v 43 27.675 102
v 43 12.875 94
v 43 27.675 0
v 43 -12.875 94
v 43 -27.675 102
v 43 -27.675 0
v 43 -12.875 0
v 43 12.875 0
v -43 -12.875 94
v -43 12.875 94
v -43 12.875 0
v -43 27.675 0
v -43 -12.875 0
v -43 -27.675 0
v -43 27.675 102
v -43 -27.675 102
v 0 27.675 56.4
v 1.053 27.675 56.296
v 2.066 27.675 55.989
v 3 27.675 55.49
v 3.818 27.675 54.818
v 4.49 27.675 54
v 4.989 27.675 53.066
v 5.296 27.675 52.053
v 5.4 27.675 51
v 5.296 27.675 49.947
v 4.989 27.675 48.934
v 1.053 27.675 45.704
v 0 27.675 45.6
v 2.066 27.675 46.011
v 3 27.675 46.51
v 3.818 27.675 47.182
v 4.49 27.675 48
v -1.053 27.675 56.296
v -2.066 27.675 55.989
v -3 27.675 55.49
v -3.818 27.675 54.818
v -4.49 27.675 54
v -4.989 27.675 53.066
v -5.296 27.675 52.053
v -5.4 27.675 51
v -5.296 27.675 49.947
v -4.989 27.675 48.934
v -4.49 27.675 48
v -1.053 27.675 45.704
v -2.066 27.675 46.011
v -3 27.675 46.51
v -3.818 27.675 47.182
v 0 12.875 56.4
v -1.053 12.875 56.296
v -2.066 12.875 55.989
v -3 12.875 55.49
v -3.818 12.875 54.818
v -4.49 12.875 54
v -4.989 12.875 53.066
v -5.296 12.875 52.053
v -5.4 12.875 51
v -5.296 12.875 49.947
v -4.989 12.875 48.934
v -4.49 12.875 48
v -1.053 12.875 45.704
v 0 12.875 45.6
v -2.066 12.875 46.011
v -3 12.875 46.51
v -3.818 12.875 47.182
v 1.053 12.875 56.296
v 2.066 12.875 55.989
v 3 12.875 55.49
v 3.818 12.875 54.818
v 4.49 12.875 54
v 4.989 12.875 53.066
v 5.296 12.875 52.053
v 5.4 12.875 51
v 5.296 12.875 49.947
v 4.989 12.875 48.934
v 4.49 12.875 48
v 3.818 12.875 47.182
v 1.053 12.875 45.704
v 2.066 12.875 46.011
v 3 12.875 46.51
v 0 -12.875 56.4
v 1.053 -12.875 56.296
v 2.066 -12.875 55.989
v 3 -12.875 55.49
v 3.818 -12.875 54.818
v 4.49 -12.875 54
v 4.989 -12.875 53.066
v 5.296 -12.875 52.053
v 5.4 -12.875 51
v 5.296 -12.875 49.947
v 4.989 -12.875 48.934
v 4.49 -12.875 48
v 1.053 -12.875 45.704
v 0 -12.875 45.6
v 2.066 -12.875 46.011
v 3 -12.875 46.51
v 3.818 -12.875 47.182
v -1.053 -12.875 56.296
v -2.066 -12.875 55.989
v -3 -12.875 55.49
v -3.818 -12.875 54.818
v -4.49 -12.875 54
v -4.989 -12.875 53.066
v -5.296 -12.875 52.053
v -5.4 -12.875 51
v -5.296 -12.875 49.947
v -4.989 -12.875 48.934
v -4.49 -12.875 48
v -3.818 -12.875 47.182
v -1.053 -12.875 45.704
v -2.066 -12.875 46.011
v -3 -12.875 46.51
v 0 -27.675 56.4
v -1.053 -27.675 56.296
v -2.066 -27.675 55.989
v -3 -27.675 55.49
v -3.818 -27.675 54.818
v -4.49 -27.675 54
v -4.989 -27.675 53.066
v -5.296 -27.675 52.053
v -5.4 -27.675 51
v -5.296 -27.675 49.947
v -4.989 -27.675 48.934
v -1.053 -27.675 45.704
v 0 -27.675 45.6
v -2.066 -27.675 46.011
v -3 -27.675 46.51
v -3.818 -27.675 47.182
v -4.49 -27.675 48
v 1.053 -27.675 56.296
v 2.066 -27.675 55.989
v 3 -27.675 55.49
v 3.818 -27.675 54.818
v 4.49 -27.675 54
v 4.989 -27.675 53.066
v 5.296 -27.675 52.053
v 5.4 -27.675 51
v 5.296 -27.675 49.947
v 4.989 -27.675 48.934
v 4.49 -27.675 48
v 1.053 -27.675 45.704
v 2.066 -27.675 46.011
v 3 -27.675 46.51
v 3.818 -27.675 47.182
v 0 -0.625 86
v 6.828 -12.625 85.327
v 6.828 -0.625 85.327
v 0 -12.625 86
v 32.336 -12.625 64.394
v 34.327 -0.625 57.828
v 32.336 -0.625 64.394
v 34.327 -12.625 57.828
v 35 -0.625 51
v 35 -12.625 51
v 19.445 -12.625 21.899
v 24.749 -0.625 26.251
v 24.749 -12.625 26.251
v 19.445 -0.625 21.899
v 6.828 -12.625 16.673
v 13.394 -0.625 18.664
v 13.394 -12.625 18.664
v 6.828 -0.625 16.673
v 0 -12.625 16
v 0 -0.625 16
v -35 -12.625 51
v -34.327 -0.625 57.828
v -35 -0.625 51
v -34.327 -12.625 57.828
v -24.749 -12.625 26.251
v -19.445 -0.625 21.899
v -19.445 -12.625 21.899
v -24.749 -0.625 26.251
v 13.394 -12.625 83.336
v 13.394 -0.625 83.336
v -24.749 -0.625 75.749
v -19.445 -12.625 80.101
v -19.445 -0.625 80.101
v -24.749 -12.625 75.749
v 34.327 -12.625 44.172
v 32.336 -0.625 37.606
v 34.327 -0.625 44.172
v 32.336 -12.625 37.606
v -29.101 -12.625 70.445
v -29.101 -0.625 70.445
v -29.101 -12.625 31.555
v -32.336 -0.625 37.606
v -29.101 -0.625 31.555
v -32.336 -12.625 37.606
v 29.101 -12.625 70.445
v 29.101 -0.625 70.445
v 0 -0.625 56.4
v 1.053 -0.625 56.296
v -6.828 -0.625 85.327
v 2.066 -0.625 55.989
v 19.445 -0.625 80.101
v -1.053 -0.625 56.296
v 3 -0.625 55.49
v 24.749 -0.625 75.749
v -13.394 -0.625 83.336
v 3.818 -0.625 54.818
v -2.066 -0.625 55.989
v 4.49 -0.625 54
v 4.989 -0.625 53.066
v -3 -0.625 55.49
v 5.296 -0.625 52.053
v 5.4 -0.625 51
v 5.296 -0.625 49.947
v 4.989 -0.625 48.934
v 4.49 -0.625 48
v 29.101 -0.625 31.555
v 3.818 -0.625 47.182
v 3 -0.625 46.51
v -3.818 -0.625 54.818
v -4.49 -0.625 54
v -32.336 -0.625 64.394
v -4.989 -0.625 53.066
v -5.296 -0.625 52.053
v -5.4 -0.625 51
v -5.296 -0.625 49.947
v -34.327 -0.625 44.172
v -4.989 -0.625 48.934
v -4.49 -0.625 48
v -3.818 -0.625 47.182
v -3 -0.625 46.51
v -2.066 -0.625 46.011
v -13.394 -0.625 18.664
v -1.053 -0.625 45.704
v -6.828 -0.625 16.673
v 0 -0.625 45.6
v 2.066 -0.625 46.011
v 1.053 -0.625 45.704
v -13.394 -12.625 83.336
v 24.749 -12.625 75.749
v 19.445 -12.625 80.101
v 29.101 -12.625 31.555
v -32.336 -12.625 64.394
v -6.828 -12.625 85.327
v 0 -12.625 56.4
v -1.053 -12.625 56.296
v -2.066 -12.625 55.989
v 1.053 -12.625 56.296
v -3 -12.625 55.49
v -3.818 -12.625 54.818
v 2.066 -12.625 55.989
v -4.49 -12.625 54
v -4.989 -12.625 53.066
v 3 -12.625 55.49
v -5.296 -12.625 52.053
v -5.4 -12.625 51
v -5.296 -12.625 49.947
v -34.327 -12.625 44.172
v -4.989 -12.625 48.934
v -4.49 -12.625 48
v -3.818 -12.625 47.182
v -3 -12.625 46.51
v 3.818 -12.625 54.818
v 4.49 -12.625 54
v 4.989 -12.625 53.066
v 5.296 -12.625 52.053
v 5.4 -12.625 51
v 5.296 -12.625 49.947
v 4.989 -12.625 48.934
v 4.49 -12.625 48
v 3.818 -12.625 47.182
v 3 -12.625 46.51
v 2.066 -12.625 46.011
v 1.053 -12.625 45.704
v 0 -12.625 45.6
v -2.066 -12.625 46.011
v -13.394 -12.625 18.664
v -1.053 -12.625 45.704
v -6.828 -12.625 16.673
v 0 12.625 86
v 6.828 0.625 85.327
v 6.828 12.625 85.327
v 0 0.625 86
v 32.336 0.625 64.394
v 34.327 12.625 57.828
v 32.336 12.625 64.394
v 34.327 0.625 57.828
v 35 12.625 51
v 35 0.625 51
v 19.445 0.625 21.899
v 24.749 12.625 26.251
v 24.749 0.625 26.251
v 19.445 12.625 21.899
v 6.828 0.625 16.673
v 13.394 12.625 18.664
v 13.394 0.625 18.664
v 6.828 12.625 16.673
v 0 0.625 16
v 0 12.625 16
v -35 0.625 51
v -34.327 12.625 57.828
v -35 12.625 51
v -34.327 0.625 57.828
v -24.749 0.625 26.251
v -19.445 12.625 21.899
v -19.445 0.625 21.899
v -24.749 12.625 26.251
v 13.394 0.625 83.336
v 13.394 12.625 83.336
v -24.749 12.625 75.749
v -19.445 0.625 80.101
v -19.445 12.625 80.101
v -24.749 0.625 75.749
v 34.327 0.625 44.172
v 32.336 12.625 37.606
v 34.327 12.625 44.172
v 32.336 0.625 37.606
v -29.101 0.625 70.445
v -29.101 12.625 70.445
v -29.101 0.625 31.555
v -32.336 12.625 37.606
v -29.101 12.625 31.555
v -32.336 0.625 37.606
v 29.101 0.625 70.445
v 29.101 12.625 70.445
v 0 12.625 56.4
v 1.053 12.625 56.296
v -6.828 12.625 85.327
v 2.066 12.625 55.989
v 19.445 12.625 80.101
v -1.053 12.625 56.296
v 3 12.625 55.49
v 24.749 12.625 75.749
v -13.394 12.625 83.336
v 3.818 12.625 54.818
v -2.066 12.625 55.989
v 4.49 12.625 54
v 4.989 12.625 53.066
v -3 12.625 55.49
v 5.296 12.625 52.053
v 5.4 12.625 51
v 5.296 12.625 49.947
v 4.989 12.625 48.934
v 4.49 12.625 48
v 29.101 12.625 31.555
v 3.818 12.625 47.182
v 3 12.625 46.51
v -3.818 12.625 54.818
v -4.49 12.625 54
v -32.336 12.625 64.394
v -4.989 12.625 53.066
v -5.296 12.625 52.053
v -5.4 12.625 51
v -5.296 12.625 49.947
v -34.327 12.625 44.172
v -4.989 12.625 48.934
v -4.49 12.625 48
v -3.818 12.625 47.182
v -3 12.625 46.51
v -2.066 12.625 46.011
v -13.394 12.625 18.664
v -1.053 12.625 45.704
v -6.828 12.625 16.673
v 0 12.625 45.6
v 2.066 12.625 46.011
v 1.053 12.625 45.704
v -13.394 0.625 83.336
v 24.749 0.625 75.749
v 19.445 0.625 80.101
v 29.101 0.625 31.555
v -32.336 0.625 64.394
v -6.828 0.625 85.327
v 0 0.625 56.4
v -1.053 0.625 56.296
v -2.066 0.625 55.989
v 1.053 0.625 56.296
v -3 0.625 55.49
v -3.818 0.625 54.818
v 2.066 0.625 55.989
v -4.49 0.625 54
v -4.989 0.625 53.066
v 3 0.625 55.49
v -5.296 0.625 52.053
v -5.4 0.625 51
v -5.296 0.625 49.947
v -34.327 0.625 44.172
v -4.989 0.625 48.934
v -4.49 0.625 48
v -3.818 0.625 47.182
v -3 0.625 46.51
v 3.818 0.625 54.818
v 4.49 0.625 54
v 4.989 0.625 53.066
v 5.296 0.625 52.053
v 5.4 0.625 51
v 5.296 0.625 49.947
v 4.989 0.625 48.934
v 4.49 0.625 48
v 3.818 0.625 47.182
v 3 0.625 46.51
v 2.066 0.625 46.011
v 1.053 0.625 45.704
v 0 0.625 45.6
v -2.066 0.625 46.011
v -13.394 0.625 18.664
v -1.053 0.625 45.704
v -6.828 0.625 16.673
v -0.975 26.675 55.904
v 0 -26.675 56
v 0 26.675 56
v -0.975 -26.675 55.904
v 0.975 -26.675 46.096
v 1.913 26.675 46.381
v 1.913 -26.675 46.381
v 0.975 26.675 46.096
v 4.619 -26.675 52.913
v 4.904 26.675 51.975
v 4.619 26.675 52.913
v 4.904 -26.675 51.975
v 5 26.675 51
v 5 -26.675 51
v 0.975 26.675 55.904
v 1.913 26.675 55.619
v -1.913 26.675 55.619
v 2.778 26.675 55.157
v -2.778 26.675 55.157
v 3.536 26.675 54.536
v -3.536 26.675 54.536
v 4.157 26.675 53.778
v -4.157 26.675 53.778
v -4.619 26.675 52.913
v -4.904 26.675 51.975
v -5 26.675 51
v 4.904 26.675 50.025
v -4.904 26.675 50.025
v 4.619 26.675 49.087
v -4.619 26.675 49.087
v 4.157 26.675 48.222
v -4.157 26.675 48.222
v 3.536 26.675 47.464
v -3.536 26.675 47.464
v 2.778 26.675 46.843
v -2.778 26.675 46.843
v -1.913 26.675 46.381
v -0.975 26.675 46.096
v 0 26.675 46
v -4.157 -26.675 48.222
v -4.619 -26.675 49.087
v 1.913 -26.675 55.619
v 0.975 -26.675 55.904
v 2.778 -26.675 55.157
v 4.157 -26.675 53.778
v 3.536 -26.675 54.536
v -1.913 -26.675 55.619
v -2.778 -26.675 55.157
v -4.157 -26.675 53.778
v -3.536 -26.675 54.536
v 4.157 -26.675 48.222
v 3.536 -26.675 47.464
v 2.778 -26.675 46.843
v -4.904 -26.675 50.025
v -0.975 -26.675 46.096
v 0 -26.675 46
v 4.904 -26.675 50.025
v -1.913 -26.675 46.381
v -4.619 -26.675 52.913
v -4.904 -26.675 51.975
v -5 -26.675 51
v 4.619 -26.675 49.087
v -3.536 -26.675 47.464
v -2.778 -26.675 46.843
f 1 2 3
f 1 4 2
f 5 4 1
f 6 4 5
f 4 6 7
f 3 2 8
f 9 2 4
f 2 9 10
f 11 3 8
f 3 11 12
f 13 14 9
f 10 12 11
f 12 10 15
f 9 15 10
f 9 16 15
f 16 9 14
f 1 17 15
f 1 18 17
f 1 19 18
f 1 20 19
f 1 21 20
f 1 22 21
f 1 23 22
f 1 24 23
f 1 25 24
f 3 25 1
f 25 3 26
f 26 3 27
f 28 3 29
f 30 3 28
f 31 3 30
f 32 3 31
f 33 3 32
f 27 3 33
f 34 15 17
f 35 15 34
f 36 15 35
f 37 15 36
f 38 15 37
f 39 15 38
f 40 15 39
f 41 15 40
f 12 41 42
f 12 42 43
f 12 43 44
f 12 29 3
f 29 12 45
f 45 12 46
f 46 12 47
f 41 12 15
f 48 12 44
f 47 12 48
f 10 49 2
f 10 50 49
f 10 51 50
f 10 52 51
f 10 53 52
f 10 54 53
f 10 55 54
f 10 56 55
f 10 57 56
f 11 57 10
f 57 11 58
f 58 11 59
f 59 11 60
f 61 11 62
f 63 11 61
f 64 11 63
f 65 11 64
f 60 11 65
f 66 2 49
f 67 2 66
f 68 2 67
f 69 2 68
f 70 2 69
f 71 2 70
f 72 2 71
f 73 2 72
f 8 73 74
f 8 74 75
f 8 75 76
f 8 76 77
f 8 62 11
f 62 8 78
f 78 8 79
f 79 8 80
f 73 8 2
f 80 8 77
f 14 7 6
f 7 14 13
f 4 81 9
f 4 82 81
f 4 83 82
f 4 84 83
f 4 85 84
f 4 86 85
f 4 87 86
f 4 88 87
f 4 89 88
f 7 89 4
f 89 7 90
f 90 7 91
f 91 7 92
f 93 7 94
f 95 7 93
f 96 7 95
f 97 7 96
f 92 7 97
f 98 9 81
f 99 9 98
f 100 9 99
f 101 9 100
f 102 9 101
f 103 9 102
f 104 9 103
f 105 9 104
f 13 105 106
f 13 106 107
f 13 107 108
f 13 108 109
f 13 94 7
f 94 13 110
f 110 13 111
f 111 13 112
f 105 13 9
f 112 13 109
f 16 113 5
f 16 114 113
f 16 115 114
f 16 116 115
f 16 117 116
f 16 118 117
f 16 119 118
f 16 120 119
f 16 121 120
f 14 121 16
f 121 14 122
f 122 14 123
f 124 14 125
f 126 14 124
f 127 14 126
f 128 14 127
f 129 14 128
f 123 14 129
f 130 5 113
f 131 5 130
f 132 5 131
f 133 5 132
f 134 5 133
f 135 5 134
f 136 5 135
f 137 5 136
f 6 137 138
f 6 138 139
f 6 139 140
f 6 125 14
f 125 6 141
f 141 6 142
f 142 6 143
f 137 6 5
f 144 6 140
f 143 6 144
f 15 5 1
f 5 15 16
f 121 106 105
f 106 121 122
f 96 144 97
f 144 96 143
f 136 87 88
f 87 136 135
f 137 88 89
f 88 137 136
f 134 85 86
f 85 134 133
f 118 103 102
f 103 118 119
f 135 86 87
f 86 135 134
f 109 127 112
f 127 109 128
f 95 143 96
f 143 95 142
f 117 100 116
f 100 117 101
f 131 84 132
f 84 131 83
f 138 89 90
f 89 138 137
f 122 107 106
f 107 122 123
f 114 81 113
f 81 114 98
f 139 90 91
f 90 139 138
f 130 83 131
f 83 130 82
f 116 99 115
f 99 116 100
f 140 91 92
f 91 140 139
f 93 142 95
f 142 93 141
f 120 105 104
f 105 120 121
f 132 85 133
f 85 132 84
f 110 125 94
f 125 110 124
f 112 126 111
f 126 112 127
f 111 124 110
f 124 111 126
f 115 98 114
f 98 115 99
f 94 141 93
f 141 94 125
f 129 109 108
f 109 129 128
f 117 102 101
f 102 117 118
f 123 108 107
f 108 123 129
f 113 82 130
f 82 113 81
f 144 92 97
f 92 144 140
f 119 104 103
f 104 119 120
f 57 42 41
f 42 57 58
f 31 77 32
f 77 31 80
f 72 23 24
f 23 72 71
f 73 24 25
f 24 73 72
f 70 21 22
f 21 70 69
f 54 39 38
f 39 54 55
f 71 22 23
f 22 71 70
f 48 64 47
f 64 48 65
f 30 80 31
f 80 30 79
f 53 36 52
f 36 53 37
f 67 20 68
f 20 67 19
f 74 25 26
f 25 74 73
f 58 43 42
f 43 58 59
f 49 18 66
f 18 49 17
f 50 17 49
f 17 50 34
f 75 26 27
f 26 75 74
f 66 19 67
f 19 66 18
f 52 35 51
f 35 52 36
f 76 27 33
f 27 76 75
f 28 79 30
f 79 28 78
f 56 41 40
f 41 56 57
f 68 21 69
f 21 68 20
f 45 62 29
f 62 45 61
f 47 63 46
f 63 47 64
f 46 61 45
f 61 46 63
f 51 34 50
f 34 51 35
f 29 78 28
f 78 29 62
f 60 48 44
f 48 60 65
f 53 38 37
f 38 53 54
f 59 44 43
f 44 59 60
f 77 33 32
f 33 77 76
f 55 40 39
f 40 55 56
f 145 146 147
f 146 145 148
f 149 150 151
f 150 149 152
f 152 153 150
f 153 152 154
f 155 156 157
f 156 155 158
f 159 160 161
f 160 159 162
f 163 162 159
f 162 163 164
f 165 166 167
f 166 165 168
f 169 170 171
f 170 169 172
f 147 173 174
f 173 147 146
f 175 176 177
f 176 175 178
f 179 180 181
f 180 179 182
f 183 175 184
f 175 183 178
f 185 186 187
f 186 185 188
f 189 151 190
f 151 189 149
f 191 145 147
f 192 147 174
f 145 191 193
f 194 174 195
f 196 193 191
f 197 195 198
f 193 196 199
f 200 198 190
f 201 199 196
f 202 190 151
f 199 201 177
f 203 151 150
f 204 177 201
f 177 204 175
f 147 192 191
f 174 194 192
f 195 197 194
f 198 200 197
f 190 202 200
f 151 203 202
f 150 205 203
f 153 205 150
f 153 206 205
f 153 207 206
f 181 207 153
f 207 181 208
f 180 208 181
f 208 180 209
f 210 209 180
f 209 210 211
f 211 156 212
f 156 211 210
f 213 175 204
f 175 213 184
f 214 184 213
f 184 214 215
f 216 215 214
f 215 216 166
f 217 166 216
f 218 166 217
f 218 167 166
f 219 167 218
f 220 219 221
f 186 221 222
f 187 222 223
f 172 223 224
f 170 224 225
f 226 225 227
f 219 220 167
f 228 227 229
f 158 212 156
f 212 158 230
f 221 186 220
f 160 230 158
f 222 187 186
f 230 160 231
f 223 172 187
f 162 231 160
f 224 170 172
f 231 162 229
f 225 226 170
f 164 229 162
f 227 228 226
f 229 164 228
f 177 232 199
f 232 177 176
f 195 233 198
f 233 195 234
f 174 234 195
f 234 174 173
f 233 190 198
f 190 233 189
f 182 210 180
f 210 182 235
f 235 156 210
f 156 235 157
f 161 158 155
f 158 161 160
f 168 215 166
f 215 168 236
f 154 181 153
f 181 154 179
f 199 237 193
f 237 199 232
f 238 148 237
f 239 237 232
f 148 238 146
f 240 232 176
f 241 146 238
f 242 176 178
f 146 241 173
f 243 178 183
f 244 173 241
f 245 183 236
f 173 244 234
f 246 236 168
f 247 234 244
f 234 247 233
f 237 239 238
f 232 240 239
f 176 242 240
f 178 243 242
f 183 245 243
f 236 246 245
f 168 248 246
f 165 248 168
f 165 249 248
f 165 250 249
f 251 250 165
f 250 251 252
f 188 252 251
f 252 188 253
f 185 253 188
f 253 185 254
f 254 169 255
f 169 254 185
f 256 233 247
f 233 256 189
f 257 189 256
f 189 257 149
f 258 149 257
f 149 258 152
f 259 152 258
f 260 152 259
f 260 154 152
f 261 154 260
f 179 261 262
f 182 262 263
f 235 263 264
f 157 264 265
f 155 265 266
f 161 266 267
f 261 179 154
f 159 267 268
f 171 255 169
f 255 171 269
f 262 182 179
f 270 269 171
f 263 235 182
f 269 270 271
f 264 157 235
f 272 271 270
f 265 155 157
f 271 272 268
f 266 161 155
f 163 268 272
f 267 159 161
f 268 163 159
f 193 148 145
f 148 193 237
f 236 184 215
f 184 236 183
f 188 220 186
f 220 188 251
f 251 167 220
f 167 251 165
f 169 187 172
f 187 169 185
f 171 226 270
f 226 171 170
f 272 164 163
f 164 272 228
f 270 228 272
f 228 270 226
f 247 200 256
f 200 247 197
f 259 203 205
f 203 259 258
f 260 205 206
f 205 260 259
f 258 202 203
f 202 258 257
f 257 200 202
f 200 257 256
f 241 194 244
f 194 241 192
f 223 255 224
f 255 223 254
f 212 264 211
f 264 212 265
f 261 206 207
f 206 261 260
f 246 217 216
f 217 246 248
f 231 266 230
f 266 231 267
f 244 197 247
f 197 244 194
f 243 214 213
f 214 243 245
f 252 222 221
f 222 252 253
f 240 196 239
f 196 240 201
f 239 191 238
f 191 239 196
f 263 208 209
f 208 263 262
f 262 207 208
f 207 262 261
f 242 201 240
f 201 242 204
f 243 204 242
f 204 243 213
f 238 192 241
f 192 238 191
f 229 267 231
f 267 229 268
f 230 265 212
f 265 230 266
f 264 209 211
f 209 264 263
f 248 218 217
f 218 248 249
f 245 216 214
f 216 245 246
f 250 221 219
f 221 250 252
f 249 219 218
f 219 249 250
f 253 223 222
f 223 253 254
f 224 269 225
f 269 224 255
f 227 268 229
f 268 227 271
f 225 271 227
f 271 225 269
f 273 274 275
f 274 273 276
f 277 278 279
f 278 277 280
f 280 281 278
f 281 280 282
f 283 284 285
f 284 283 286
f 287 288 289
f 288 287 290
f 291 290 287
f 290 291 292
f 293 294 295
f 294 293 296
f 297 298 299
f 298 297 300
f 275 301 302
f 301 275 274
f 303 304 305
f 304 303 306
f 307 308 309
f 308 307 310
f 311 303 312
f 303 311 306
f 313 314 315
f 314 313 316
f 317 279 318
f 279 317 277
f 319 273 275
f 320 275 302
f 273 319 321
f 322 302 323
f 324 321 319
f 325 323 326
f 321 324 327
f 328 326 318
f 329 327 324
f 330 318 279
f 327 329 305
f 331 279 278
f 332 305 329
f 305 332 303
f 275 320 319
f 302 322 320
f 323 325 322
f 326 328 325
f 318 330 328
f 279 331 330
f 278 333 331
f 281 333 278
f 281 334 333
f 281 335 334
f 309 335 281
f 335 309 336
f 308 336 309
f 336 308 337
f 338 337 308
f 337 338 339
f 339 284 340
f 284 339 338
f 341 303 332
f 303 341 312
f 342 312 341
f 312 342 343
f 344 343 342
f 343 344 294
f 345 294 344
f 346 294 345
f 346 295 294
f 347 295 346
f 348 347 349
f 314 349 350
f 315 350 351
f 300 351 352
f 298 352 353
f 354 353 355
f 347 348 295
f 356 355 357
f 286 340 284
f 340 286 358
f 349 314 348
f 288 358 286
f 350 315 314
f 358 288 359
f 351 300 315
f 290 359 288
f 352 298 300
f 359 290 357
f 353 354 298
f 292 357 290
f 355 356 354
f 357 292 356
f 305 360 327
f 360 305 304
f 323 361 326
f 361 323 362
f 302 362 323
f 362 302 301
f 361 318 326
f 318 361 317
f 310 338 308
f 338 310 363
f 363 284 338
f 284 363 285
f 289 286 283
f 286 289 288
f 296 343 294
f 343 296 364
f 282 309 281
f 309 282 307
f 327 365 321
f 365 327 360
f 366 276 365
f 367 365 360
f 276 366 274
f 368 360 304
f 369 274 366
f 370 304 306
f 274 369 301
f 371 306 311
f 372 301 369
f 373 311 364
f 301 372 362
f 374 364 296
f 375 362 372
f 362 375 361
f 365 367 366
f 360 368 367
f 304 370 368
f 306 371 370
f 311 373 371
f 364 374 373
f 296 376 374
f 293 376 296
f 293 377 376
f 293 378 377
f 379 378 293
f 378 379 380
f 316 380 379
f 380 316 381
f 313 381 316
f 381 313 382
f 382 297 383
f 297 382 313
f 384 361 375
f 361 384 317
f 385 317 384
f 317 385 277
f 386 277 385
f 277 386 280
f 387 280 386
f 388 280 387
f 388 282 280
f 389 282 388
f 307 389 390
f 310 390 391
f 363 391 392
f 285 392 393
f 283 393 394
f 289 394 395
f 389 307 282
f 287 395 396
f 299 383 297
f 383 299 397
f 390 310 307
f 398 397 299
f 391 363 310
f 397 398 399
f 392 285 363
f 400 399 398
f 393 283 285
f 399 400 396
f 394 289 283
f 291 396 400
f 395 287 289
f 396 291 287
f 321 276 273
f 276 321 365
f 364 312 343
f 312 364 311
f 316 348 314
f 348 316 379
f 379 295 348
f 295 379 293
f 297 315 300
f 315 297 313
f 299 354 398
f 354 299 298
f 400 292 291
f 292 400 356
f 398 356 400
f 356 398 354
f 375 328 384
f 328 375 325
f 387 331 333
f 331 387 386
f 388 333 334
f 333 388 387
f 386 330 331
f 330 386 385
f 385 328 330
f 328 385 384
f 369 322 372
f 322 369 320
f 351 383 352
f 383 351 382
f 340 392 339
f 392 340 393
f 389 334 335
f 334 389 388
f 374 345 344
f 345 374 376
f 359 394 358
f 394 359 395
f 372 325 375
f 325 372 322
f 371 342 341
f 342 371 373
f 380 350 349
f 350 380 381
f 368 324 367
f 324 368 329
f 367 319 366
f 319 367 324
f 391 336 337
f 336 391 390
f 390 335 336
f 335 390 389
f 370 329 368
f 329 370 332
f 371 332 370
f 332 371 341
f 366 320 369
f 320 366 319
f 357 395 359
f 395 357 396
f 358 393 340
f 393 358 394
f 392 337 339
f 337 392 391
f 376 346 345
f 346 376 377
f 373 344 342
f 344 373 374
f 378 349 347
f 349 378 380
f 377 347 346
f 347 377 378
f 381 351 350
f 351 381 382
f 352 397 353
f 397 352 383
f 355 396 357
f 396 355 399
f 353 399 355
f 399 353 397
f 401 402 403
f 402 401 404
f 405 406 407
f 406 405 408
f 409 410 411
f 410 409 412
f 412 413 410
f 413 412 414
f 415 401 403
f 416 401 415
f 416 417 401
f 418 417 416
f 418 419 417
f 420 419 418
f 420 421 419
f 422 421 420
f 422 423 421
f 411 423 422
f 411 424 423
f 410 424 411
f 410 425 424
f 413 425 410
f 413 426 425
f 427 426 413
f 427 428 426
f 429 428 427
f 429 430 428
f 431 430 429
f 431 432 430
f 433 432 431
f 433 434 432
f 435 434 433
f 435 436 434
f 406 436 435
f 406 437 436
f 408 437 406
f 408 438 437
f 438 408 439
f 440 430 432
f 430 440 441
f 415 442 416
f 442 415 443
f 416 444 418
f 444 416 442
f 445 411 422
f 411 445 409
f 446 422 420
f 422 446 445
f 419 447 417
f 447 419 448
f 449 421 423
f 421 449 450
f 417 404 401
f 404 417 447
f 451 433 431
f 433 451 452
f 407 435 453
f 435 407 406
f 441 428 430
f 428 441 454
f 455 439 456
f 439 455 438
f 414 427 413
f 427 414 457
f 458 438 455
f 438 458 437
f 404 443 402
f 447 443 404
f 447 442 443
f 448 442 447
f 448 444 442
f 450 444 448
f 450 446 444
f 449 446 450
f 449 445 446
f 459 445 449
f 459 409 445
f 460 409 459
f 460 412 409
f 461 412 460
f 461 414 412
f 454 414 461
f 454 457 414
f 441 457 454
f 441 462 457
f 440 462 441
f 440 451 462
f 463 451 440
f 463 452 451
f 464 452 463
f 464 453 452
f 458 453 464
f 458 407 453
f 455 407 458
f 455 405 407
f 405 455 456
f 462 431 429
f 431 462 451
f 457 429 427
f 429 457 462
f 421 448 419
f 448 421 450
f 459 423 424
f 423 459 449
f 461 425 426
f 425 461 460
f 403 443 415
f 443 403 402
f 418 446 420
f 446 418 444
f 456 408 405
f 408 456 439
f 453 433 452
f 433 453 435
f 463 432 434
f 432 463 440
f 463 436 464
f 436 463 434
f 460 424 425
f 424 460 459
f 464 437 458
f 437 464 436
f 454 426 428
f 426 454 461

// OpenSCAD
$fn = 32;

// ------------------------------------------------------------------------
// Trolley wheel set: wheels d70, fork 94 mm tall
// Every part is its own module, assembly() places every instance.
// ------------------------------------------------------------------------

// --- part 1 ---
module trolley_fork() {
  difference() {
    union() {
      translate([-43, 12.875, 0]) cube([86, 14.8, 94]);
      translate([-43, -27.675, 0]) cube([86, 14.8, 94]);
      translate([-43, -27.675, 94]) cube([86, 55.35, 8]);
    }
    translate([0, -20.275, 51]) rotate([90, 0, 0]) cylinder(h = 16.8, d = 10.8, center = true);
    translate([0, 20.275, 51]) rotate([90, 0, 0]) cylinder(h = 16.8, d = 10.8, center = true);
  }
}

// --- part 2 ---
module trolley_wheel() {
  difference() {
      translate([0, 0, 0]) cylinder(h = 12, d = 70);
      translate([0, 0, -1]) cylinder(h = 14, d = 10.8);
    }
}

// --- part 3 ---
module trolley_axle() {
  translate([0, 0, -26.675]) cylinder(h = 53.35, d = 10);
}

// --- assembly ---
module assembly() {
  color([0.80, 0.24, 0.20]) translate([0, 0, 0]) rotate([0, 0, 0]) trolley_fork();
  color([0.20, 0.45, 0.75]) translate([0, -0.625, 51]) rotate([90, 0, 0]) trolley_wheel();
  color([0.25, 0.62, 0.32]) translate([0, 12.625, 51]) rotate([90, 0, 0]) trolley_wheel();
  color([0.92, 0.70, 0.18]) translate([0, 0, 51]) rotate([90, 0, 0]) trolley_axle();
}

assembly();
